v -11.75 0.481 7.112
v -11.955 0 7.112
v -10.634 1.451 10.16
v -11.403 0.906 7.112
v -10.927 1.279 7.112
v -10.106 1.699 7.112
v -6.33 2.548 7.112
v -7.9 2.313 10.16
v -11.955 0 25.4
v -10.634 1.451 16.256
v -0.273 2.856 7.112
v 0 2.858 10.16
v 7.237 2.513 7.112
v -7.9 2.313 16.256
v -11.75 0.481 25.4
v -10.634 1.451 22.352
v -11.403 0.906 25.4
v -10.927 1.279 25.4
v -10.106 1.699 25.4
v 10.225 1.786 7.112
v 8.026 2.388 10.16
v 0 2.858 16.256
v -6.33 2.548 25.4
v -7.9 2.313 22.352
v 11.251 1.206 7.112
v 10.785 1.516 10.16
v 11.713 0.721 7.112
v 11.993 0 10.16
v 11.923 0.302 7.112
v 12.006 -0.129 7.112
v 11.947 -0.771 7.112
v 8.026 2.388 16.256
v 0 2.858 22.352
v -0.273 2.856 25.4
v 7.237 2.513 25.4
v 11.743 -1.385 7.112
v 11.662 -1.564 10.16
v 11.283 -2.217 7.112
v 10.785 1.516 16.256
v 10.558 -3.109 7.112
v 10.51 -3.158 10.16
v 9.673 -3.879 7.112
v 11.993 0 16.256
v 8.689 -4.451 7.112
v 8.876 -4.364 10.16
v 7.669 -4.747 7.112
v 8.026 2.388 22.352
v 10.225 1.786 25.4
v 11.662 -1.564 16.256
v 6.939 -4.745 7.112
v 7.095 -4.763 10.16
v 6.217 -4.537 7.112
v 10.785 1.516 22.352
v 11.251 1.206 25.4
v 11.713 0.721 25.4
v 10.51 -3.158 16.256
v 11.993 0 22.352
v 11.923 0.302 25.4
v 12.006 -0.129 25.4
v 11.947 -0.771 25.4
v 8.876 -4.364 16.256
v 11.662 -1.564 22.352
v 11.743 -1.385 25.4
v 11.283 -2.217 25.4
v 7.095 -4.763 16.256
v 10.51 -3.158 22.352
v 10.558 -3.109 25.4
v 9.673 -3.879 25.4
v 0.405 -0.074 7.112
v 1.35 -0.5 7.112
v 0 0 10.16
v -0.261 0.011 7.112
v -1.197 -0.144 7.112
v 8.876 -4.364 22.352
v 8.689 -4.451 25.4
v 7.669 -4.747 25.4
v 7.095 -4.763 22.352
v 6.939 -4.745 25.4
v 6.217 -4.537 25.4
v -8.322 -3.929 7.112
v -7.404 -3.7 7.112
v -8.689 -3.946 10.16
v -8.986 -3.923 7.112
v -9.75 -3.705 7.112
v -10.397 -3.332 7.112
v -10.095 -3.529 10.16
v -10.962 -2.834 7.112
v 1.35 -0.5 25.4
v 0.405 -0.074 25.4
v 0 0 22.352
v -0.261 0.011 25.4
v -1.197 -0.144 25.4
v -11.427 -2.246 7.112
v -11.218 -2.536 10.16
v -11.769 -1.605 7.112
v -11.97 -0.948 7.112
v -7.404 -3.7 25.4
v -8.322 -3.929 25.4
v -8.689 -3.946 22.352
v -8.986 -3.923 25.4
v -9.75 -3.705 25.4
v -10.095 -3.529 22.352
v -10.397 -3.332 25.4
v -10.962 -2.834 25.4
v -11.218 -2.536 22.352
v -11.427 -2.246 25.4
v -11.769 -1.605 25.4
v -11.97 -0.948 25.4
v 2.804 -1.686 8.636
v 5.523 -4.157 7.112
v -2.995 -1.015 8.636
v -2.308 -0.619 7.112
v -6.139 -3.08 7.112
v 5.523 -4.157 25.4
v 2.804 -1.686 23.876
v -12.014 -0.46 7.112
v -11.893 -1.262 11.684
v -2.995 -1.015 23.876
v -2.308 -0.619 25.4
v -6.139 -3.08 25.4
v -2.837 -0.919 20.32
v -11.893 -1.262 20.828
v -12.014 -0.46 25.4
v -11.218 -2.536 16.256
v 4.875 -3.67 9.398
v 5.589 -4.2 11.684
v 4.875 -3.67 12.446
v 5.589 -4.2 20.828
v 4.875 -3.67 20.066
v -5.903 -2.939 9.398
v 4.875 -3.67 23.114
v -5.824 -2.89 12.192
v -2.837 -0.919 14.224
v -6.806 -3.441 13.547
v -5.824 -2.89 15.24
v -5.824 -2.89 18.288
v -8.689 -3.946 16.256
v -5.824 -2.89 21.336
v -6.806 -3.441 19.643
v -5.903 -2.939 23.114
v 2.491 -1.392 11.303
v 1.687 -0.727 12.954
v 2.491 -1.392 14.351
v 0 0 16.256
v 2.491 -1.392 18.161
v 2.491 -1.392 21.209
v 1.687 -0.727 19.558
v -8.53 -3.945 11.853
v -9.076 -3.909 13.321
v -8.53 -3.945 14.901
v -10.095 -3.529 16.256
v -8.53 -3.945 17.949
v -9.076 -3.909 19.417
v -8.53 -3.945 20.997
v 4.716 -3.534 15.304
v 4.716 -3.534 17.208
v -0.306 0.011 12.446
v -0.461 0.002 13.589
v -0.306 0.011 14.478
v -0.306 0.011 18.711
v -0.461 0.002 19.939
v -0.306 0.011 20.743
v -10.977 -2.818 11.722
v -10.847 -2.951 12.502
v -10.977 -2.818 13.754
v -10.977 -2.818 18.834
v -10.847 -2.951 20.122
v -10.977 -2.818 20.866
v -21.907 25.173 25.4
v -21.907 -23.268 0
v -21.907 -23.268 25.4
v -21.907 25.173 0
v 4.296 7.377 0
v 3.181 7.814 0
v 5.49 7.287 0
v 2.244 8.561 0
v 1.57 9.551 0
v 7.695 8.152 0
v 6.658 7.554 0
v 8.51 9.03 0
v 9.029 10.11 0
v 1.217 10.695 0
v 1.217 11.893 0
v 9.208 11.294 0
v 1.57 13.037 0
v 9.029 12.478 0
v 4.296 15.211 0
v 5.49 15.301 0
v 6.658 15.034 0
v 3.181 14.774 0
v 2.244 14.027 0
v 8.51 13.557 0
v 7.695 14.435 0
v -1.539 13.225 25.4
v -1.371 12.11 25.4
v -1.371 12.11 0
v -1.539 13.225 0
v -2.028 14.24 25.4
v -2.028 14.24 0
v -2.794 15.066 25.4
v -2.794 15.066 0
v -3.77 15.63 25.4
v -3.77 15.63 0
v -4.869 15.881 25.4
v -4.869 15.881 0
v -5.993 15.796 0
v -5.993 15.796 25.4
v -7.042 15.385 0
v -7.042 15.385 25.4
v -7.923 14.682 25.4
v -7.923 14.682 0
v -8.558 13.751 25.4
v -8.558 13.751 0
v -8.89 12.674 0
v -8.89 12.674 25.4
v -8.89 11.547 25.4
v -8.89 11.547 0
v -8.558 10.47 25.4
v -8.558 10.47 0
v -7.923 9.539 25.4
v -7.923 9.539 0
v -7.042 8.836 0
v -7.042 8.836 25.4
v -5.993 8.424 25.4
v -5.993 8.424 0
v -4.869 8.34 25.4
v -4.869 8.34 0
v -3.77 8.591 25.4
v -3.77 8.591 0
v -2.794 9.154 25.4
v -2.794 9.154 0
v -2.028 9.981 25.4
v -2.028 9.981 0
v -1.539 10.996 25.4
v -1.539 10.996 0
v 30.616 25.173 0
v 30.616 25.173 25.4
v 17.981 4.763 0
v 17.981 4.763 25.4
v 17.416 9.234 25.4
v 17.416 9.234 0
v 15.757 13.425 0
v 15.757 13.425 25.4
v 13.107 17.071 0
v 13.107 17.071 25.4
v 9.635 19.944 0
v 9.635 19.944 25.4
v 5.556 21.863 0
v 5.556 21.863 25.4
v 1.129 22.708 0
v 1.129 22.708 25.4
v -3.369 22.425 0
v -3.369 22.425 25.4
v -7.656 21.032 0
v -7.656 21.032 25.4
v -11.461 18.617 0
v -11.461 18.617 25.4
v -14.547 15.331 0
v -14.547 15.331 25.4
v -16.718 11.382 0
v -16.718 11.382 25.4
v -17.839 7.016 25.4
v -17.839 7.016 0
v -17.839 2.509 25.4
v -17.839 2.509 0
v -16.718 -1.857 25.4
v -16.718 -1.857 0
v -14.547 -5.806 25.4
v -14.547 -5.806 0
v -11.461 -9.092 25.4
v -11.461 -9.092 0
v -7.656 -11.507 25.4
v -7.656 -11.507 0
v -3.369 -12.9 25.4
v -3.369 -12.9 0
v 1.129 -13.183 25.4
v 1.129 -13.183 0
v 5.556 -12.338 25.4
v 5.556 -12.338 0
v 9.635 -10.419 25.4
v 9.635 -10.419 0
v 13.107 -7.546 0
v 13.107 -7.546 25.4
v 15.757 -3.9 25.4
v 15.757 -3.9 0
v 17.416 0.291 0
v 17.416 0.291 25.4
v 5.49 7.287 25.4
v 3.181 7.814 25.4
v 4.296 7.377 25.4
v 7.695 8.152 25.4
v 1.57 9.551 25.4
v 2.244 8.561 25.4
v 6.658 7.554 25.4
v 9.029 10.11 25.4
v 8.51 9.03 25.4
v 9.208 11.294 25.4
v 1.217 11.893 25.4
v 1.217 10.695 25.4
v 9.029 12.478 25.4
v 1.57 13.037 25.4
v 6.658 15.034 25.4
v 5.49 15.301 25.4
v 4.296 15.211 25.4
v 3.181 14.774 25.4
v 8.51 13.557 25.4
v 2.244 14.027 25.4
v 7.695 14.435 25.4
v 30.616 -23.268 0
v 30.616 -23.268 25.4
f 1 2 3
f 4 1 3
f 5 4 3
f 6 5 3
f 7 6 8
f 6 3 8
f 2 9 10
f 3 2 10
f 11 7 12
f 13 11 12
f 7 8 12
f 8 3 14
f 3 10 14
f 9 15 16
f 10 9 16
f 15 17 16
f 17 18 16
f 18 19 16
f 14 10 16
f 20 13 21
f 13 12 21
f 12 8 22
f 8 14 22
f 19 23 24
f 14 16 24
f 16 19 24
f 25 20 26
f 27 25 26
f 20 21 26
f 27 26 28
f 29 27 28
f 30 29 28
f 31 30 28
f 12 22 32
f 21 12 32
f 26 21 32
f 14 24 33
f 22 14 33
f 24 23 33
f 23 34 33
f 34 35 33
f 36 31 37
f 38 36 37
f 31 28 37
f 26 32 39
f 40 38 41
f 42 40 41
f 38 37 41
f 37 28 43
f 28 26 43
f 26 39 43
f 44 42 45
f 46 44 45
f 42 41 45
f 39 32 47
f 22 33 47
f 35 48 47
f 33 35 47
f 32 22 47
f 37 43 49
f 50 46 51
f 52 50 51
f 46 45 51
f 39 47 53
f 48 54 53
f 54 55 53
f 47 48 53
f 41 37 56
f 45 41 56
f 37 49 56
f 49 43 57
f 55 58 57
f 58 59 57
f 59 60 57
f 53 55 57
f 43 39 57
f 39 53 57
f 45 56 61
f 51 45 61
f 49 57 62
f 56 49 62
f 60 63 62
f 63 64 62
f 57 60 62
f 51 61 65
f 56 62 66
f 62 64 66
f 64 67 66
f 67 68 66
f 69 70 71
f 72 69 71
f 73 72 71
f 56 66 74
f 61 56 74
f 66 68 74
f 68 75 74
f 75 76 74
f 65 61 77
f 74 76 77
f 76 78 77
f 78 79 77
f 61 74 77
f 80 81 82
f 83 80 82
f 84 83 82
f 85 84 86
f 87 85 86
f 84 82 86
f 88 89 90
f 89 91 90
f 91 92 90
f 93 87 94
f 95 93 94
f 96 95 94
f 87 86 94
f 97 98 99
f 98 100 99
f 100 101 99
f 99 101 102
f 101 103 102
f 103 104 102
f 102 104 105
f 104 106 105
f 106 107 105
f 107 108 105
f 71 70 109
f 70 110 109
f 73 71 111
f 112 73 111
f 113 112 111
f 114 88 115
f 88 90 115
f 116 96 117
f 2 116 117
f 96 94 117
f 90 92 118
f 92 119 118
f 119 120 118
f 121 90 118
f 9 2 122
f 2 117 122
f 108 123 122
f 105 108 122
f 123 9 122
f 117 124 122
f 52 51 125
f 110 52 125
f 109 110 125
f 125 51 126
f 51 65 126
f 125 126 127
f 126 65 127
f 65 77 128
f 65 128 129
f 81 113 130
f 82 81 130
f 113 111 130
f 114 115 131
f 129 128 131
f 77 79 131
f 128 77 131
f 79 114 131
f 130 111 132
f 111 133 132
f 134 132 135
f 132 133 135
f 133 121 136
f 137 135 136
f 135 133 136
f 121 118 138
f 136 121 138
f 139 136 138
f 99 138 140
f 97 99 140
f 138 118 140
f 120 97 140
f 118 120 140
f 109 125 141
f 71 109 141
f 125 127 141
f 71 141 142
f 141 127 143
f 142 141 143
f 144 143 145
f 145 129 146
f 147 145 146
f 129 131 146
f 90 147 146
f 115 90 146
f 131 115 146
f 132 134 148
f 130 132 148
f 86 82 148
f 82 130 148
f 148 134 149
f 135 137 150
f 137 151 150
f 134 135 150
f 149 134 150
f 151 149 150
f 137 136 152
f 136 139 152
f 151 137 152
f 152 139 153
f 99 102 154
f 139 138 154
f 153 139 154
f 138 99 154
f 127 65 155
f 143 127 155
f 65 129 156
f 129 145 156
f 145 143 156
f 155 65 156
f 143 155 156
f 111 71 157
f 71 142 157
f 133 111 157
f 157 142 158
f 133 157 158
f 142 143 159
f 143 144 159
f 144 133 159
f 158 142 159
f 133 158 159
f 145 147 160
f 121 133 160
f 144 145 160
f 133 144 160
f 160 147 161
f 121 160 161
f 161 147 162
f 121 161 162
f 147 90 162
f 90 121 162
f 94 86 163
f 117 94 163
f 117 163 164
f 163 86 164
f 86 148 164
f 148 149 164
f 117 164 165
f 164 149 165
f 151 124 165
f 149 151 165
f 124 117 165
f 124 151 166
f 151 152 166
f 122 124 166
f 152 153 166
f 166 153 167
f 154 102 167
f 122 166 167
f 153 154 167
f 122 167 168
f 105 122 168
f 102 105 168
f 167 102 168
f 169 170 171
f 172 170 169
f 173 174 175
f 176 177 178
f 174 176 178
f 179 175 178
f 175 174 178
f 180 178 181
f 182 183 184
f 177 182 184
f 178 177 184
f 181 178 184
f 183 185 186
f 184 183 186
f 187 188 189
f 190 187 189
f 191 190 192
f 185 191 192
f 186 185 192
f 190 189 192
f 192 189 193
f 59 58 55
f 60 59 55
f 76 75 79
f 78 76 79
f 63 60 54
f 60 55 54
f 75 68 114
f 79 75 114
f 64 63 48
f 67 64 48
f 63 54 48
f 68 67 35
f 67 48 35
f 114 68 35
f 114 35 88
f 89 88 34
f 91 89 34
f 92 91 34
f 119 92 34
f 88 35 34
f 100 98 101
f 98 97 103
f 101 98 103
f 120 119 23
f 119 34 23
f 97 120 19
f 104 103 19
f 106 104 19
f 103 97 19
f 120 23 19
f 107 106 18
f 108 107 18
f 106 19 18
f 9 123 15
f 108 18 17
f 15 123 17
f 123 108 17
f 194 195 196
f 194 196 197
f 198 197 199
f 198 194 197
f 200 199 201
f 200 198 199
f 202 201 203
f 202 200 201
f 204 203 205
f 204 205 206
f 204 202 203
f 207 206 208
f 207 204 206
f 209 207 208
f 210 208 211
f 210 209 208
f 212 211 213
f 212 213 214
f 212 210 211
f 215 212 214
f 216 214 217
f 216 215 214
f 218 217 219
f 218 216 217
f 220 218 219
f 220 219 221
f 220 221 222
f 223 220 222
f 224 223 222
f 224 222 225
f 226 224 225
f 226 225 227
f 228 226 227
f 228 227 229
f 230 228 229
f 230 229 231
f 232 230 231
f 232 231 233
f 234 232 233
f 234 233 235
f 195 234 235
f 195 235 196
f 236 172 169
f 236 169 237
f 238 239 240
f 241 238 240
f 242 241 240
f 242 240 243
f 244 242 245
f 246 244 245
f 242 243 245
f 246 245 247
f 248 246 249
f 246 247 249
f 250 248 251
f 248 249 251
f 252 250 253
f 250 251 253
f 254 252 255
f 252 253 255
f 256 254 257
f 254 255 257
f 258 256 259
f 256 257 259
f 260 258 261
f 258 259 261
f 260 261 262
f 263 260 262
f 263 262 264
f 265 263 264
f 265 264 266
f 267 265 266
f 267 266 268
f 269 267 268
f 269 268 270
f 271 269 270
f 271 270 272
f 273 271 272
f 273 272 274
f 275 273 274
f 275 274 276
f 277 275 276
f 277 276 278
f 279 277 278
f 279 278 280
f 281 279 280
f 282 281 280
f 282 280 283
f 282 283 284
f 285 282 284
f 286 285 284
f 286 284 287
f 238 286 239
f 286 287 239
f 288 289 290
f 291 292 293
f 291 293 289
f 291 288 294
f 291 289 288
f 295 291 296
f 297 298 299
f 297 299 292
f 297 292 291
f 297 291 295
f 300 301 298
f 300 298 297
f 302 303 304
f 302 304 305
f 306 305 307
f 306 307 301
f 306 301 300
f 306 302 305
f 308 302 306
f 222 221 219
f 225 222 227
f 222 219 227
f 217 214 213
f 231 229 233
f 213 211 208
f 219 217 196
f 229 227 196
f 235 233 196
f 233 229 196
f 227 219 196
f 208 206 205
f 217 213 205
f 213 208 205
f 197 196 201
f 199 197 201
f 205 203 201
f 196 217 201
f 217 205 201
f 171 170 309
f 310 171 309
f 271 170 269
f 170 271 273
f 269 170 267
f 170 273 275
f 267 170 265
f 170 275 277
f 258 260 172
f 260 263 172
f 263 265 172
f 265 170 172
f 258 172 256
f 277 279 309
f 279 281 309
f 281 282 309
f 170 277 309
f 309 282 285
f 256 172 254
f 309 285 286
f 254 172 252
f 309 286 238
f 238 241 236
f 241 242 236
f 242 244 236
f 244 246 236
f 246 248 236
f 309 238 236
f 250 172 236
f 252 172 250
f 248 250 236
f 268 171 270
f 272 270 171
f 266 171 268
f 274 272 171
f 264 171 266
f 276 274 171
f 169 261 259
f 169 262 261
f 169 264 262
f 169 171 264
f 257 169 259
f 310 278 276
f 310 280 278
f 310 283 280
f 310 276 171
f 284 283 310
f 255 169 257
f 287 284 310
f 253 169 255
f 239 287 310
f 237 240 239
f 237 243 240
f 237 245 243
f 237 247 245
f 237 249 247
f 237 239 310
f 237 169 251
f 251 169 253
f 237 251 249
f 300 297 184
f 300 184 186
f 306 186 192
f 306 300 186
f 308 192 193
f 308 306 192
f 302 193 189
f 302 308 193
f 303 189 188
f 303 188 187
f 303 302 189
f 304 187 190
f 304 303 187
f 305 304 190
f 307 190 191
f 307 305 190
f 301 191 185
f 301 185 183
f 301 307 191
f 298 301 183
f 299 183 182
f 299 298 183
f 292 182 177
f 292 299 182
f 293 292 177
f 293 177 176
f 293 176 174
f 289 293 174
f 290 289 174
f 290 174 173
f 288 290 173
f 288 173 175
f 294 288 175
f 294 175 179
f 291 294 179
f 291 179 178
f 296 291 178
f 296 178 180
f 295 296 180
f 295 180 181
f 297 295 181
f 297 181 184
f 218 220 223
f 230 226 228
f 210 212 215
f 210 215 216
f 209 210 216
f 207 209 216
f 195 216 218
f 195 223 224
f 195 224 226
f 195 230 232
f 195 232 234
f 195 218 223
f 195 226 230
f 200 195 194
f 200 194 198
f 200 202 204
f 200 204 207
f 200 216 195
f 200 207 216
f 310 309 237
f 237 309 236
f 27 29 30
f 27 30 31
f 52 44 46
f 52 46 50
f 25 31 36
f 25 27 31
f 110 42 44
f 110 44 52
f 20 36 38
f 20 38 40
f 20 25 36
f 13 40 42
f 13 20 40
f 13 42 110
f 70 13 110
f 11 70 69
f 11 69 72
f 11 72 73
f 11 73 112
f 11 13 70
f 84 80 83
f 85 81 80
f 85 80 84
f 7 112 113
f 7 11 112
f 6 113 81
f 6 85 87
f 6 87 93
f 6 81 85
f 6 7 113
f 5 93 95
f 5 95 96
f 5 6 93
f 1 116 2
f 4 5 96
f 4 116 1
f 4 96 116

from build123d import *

# Parameters (mm, degrees)
F0_W     = 52.5235719979
F0_H     = 48.4414305538
F1_DEPTH = 25.4
F3_R     = 17.9806924125
F3_R_2   = 3.780727698
F3_R_3   = 4.0181404967
F6_DEPTH = 27.432
F7_DEPTH = 18.288


# Not quite as in the source:
# - the program builds the solid bodies; features that only make, move or delete a surface that nothing else refers to are left out


with BuildPart() as f1:
    # F0 (on Top) → F1 (new body)
    with BuildSketch(Plane.XY):
        with Locations((4.3542869389, 0.9524999186)):
            Rectangle(F0_W, F0_H)
    extrude(amount=F1_DEPTH)

    # F3 (on face) → F6 (cut)
    with BuildSketch(Plane.XY.offset(25.4)):
        with Locations((0, 4.7625000589)):
            Circle(F3_R)
        with Locations((-5.1515786909, 12.1103571728)):
            Circle(F3_R_2, mode=Mode.SUBTRACT)
        with Locations((5.1898504607, 11.2939290702)):
            Circle(F3_R_3, mode=Mode.SUBTRACT)
    extrude(amount=-F6_DEPTH, mode=Mode.SUBTRACT)


with BuildPart() as f7:
    # F4 (on face) → F7 (new body)
    with BuildSketch(Plane.XY.offset(25.4)):
        with BuildLine():
            add(Edge.make_bspline(
                [(-11.9551504031, 0), (-11.3374873906, 2.3918507841), (-0.1404740389, 3.2569434634), (16.0461571526, 2.2516272688), (6.2552175699, -8.3932651273), (0.4505515588, 4.2969461524), (-8.3923398431, -7.1268055014), (-12.3538703235, -1.5440111115), (-11.9551504031, 0)],
                knots=[0, 0, 0, 0, 0.1957909913, 0.3918782168, 0.5378469307, 0.701092352, 0.873611068, 1, 1, 1, 1], degree=3))
        make_face()
    extrude(amount=-F7_DEPTH)


solid = Compound([f1.part, f7.part])
